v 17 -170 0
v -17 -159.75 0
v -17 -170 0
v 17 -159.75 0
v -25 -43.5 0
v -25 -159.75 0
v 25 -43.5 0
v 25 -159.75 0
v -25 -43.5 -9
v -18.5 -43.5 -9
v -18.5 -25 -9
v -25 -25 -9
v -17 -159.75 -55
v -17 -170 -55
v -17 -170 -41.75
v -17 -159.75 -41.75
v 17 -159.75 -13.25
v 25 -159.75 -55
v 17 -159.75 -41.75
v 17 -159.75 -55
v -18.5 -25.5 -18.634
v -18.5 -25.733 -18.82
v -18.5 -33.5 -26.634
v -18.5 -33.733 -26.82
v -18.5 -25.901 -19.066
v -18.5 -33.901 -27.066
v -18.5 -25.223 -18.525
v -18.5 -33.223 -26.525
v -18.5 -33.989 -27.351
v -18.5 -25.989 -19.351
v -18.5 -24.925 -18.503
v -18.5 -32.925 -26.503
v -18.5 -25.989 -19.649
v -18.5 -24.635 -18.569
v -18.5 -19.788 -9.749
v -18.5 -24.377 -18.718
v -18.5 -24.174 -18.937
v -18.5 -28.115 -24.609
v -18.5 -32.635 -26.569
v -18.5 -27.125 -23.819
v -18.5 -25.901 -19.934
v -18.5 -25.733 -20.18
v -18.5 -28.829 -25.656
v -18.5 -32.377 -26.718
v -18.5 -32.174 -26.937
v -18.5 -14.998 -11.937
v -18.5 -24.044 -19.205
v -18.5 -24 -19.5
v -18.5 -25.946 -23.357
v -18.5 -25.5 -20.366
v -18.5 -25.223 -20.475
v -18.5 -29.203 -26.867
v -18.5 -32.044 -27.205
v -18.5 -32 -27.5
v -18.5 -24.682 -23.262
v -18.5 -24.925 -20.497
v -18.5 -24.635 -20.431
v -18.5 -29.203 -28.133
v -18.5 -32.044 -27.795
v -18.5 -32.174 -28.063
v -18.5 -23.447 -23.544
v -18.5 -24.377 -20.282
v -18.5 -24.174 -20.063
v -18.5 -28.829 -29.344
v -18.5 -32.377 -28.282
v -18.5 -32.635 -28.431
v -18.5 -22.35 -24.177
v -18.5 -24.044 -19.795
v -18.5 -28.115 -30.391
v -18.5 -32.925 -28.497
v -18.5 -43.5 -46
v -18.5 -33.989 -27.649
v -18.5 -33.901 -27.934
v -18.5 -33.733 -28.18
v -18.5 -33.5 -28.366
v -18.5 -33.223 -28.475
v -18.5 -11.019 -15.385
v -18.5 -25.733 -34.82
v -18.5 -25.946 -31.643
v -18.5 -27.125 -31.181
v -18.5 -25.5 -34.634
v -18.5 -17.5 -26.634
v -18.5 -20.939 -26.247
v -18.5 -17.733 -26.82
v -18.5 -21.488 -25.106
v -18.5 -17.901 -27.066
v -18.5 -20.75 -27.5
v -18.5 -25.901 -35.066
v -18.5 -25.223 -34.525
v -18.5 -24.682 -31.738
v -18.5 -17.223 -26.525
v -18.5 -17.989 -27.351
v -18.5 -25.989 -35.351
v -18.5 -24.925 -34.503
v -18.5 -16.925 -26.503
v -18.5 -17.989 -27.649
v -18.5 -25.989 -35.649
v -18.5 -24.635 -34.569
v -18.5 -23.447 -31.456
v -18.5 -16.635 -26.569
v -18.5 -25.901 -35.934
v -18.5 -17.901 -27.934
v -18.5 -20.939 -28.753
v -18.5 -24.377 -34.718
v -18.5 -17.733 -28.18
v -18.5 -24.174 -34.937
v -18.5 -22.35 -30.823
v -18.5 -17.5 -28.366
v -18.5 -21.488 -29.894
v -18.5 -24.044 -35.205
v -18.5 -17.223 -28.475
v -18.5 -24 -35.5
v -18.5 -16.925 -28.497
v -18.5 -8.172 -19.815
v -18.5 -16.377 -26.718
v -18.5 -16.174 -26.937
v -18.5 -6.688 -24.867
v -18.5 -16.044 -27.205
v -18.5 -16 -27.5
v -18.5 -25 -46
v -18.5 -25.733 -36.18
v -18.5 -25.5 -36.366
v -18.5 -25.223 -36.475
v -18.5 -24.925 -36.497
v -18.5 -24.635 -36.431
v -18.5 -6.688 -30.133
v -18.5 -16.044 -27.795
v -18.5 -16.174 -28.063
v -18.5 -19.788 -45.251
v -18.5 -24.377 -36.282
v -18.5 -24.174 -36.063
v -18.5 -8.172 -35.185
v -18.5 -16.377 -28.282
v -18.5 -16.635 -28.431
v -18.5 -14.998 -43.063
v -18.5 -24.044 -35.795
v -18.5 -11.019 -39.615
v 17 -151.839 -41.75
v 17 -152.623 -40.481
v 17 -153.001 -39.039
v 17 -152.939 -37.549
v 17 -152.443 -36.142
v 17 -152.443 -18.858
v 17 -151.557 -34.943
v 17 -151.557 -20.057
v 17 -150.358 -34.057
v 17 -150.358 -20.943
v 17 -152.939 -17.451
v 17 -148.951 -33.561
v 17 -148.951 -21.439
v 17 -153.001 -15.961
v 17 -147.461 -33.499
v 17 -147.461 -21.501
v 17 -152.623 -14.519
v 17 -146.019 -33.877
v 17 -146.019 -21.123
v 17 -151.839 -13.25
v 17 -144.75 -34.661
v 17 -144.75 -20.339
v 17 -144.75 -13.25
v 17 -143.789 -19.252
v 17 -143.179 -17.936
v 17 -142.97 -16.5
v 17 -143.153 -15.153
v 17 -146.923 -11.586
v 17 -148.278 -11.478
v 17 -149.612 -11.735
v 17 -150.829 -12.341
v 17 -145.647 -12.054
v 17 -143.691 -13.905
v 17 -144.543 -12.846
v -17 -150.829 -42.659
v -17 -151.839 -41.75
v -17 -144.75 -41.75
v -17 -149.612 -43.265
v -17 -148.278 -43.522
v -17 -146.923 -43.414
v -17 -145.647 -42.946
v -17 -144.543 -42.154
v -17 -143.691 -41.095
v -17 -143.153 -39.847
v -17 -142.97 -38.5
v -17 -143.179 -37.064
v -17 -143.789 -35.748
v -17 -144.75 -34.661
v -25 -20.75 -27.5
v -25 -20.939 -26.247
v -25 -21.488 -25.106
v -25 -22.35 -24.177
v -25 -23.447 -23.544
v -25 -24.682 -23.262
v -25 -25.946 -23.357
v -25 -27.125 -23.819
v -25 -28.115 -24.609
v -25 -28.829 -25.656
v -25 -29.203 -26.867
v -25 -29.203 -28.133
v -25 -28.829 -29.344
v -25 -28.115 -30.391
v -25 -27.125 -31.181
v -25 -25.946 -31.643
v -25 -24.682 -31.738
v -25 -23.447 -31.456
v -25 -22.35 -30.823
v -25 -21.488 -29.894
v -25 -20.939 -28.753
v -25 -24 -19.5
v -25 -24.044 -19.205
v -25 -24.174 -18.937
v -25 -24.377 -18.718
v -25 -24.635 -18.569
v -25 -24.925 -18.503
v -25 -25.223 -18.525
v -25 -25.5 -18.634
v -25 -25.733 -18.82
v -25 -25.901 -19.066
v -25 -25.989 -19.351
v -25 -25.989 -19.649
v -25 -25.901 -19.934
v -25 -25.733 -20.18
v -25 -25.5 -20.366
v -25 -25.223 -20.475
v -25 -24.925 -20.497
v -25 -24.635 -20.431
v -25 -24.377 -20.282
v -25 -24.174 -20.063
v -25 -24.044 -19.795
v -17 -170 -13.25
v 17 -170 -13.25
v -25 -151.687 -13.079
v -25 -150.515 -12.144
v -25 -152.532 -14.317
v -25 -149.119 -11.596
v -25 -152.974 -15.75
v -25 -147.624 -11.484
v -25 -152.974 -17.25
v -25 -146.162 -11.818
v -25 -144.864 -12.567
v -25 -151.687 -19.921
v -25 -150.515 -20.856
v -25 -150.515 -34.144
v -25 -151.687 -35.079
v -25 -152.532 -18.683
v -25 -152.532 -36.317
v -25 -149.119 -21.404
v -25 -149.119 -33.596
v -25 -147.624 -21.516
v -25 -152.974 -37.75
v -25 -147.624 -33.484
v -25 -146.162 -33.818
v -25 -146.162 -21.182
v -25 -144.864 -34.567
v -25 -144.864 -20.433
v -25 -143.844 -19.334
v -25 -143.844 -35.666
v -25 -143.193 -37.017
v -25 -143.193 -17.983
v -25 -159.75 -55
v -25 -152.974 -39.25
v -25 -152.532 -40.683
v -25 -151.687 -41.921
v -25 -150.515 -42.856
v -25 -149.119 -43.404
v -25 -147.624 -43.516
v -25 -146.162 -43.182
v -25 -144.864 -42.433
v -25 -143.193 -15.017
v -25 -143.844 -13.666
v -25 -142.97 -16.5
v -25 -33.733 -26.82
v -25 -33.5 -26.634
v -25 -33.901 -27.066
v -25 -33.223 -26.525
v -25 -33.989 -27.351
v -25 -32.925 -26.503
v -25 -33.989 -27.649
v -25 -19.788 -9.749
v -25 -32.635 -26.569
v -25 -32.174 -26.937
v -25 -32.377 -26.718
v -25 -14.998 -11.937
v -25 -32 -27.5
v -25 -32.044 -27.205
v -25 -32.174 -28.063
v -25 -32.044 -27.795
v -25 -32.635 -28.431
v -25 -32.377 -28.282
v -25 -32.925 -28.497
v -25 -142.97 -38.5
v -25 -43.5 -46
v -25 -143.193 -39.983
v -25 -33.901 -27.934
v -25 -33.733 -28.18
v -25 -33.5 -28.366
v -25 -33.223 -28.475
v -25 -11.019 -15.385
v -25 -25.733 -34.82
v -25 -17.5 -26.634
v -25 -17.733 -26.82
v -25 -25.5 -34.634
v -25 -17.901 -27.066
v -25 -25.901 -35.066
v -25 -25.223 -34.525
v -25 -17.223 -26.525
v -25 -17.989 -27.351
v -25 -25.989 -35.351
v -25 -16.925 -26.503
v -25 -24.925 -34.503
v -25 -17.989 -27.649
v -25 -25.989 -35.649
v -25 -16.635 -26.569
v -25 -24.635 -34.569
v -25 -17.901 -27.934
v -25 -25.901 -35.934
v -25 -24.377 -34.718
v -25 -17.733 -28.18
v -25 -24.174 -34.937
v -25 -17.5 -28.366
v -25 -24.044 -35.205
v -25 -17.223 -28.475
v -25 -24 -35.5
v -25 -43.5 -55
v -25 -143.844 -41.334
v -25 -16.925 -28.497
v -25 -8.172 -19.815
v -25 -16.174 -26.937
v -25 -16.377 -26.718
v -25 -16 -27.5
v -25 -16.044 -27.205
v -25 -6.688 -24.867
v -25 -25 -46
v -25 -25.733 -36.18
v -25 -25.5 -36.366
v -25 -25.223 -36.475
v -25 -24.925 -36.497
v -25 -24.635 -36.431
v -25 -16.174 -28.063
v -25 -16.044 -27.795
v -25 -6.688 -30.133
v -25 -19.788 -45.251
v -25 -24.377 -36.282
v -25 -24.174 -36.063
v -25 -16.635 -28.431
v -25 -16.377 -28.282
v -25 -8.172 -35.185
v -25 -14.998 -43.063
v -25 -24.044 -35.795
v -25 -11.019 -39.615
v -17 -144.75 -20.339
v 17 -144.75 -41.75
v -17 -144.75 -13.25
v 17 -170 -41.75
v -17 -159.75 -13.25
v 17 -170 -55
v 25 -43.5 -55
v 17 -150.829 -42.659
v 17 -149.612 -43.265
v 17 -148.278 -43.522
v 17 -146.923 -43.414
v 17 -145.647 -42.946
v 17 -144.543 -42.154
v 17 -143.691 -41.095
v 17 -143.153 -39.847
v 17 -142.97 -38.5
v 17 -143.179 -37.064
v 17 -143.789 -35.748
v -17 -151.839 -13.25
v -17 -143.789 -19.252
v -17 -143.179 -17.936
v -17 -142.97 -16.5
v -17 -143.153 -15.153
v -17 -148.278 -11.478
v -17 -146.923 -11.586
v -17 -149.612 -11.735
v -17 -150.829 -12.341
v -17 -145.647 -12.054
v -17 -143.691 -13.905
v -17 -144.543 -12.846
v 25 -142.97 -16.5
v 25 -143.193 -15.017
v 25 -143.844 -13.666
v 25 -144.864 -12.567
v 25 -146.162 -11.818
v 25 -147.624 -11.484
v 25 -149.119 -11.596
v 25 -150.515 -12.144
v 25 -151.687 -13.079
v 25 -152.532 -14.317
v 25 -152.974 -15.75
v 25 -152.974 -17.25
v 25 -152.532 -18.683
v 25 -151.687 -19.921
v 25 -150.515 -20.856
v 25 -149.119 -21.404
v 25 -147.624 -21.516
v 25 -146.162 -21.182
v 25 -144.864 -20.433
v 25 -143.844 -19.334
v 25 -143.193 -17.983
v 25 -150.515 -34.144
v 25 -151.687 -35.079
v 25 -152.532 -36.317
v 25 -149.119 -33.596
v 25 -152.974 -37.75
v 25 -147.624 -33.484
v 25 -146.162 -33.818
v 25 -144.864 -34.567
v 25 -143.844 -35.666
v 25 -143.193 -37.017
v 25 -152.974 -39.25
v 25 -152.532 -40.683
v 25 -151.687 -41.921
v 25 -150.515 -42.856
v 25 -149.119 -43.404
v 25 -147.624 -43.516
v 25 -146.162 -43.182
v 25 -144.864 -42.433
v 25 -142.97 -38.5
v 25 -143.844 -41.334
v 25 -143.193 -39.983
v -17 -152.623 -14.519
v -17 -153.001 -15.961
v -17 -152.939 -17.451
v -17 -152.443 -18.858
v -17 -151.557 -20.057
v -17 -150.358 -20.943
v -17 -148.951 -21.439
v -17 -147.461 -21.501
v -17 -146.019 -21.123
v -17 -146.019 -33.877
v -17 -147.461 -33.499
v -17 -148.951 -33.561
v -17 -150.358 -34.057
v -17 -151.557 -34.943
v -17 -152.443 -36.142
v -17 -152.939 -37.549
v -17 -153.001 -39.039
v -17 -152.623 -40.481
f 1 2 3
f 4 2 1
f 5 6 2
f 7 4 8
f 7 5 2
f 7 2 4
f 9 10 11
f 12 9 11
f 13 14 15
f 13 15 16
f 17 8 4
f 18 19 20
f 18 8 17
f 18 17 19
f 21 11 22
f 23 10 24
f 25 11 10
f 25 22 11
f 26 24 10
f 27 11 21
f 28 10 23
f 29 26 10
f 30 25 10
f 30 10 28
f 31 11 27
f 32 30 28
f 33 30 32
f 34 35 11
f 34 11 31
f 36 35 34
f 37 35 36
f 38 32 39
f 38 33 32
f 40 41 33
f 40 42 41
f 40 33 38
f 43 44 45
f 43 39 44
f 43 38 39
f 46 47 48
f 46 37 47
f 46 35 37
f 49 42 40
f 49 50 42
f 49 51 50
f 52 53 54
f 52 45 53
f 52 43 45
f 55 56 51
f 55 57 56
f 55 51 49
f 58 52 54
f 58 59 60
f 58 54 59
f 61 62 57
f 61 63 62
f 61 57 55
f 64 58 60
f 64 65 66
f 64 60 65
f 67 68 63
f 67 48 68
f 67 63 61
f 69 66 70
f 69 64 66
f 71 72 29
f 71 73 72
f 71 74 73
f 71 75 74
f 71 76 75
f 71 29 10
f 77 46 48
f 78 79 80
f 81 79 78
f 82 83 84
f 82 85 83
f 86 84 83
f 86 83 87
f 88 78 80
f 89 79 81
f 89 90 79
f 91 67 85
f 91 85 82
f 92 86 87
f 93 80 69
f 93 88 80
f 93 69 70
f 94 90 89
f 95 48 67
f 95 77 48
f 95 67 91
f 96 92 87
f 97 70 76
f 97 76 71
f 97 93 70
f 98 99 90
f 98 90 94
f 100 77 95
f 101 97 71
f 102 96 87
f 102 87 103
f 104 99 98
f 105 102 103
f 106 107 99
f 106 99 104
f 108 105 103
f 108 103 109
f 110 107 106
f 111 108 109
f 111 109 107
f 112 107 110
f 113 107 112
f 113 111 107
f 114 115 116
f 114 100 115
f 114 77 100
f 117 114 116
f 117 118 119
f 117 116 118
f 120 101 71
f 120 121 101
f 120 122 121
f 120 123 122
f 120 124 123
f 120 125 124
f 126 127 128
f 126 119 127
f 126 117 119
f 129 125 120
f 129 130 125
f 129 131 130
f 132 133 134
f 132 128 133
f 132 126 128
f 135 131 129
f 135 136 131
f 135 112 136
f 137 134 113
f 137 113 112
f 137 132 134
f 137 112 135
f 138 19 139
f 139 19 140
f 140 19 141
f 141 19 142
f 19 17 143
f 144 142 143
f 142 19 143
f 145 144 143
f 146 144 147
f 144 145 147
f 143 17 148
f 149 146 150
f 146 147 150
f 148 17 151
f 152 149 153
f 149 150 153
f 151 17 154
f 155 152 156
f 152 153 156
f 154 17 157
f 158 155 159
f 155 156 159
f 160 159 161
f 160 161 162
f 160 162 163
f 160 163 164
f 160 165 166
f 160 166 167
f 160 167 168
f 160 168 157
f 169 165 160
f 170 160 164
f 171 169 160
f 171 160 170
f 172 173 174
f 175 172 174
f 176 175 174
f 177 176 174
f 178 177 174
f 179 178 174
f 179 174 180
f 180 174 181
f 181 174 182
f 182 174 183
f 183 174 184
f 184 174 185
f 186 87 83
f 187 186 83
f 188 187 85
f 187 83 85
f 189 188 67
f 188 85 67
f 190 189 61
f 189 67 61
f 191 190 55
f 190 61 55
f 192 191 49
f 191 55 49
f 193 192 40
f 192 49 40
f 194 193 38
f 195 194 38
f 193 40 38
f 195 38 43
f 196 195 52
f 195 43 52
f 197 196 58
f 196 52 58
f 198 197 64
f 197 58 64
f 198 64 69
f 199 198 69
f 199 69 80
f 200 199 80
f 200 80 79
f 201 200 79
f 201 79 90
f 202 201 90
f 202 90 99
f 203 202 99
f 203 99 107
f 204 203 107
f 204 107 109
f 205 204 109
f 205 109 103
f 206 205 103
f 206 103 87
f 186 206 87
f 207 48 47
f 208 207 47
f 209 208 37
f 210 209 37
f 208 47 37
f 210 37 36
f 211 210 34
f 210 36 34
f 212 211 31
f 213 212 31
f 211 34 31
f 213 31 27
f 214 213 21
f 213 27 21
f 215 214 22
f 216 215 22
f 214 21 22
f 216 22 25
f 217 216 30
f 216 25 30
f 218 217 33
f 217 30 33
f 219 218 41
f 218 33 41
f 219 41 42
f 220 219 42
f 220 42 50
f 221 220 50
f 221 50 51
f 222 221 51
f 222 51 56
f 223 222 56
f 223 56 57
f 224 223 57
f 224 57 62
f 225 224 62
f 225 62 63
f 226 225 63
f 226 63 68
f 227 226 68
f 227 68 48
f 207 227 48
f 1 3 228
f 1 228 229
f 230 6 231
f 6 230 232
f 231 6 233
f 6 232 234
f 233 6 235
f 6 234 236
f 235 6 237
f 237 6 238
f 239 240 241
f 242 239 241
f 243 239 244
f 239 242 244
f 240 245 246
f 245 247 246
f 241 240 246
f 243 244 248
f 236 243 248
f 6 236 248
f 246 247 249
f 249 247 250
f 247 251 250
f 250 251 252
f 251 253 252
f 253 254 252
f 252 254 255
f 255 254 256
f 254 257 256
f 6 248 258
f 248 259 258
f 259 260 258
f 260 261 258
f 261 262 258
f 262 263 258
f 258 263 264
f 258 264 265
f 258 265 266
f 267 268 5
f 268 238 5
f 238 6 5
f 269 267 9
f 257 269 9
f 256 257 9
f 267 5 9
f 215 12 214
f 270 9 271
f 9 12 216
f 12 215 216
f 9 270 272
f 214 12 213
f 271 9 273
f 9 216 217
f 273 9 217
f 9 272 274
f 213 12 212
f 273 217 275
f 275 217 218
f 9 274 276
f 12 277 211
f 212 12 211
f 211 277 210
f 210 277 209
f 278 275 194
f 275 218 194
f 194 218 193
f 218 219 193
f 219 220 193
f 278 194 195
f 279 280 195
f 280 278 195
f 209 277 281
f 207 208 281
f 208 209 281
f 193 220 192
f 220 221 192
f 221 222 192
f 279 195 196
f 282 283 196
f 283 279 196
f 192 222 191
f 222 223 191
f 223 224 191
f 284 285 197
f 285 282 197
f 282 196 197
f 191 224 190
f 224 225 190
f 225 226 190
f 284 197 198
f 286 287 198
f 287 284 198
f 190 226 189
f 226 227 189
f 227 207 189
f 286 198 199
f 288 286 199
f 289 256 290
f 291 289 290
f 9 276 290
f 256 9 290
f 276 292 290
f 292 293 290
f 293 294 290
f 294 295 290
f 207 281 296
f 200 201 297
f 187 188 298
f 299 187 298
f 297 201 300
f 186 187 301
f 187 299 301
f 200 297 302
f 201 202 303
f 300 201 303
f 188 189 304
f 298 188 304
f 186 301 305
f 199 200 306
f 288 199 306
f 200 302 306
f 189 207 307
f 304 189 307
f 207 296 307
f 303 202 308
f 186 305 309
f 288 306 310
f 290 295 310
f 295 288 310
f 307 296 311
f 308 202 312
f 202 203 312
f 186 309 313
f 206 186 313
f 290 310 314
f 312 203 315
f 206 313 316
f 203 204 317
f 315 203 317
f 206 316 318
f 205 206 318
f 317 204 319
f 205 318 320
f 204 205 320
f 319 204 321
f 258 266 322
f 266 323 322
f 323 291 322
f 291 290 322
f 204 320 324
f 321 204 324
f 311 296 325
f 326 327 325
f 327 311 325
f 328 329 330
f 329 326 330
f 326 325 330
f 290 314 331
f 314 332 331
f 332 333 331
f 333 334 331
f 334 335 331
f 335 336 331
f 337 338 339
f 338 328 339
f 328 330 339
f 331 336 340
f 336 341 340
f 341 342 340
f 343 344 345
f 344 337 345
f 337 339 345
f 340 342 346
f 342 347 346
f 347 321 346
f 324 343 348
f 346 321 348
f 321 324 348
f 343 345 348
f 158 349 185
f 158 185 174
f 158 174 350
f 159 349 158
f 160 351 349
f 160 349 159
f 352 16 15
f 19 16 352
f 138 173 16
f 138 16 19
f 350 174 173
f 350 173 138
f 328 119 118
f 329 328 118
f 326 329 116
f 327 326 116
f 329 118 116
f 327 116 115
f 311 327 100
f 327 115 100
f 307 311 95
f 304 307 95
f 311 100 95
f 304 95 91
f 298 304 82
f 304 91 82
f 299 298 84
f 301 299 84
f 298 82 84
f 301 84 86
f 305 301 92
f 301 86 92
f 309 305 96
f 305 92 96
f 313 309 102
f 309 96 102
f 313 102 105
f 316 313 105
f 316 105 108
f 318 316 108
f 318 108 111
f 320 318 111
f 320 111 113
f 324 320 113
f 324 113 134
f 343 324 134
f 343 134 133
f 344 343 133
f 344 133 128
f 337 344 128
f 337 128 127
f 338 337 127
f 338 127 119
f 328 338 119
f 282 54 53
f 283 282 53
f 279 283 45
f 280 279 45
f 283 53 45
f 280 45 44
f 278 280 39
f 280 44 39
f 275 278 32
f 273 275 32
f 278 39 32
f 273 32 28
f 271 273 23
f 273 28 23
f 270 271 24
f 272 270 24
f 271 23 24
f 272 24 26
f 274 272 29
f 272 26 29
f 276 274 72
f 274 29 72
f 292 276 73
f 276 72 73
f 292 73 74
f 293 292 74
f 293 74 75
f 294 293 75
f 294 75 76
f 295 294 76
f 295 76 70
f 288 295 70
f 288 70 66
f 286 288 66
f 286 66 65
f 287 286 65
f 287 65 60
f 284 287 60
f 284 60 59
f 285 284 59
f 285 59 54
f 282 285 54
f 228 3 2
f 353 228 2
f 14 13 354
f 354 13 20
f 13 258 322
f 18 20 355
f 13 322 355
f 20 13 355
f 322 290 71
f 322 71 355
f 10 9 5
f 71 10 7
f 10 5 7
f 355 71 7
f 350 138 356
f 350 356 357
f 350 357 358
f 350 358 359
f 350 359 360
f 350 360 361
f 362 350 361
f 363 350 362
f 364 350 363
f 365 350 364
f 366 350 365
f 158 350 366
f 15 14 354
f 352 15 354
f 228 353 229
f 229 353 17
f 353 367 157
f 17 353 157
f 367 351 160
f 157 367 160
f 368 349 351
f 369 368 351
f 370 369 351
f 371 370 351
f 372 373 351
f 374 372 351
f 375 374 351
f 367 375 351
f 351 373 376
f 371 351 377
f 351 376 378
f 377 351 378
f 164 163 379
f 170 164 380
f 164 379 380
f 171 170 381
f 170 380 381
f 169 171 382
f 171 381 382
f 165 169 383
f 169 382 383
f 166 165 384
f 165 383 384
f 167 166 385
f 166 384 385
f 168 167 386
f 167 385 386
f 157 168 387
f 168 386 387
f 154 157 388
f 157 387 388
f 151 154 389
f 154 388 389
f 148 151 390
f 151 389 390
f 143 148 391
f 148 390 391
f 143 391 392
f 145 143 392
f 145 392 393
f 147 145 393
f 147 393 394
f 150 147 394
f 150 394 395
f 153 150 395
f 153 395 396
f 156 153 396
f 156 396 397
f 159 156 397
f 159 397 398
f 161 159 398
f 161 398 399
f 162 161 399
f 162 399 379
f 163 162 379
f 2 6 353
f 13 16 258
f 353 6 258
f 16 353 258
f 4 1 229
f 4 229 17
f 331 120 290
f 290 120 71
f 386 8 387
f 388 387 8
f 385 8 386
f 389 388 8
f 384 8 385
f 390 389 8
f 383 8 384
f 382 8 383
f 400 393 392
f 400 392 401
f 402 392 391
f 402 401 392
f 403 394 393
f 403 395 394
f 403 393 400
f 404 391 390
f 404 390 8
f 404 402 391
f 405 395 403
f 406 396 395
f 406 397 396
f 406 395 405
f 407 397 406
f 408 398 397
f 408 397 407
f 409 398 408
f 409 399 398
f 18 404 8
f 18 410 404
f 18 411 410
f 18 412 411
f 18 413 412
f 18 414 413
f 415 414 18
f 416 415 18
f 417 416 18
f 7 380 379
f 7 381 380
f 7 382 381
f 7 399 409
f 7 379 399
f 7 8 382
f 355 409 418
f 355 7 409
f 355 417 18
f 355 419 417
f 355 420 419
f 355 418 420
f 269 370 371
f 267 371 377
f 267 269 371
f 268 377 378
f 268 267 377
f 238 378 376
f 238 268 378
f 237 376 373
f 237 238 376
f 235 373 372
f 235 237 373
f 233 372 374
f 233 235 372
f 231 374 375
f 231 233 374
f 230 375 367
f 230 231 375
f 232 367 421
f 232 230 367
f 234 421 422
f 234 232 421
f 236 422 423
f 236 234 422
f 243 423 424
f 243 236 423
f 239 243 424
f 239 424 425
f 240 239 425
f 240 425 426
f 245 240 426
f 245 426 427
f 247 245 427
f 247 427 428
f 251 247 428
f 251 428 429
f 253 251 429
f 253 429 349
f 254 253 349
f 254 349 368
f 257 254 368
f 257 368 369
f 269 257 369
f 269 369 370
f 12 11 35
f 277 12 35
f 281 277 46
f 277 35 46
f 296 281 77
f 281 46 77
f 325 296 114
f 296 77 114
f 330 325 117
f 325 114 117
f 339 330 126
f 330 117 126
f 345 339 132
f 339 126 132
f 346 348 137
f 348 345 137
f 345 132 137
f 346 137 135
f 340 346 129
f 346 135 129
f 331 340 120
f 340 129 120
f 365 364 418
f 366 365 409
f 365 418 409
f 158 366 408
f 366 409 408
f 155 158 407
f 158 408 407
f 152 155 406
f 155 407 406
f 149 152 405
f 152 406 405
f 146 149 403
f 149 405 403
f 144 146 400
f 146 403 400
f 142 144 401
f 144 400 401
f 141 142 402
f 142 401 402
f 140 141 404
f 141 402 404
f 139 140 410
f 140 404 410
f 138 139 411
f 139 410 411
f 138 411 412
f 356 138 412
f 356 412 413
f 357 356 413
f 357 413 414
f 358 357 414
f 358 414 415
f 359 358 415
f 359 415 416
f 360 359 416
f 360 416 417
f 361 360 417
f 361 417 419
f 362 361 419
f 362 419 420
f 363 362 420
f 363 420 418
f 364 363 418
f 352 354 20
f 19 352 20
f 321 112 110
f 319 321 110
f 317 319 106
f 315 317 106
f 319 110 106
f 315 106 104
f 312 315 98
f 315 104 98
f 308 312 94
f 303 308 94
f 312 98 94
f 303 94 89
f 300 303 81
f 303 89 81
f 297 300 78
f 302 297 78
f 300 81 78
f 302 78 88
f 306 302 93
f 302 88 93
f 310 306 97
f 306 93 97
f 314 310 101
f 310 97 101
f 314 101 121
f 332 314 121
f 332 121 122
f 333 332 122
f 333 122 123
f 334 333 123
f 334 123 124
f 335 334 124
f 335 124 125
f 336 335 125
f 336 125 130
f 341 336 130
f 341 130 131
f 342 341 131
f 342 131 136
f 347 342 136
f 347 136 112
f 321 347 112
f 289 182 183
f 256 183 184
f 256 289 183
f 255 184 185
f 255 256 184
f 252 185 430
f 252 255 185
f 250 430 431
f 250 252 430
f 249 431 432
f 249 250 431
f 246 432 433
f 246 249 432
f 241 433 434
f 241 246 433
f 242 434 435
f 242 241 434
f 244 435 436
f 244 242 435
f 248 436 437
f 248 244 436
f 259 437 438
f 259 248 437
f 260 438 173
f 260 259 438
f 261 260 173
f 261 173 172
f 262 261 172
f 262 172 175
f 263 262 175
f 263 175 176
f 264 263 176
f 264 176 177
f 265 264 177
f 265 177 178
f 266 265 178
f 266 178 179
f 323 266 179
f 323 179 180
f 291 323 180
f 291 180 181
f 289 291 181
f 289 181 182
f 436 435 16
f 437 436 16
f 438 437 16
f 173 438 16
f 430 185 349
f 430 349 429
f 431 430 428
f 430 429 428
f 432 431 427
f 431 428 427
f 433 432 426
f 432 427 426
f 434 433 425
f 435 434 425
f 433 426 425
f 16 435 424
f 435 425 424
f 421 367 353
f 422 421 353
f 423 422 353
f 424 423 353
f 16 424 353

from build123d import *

# Parameters (mm, degrees)
SKETCH1_W               = 50
SKETCH1_H               = 150
BOSS_EXTRUDE1_DEPTH     = 55
CUT_EXTRUDE1_DEPTH      = 168.406690428
CUT_EXTRUDE1_DEPTH_BACK = 45
SKETCH2_R               = 10.25
SKETCH7_R               = 1
SKETCH7_R_2             = 4.25
CUT_EXTRUDE3_DEPTH      = 10
SKETCH8_W               = 55
SKETCH8_H               = 55
SKETCH8_R               = 10.25
BOSS_EXTRUDE2_DEPTH     = 50
SKETCH10_W              = 8
SKETCH10_H              = 10.25
SKETCH10_W_2            = 17
SKETCH10_H_2            = 1
SKETCH10_W_3            = 34
SKETCH10_H_3            = 20
SKETCH10_H_4            = 5
CUT_EXTRUDE4_DEPTH      = 214.717102732
SKETCH11_W              = 34
SKETCH11_H              = 13.25
BOSS_EXTRUDE4_DEPTH     = 25
SKETCH13_W              = 55
SKETCH13_H              = 10
CUT_EXTRUDE5_DEPTH      = 8
SKETCH14_R              = 5.030159043
CUT_EXTRUDE6_DEPTH      = 8
SKETCH15_W              = 34
SKETCH15_H              = 0.25
BOSS_EXTRUDE5_DEPTH     = 13.25
CUT_EXTRUDE7_DEPTH      = 181.416185527
BOSS_EXTRUDE6_START     = 1.5
SKETCH19_R              = 10.25
SKETCH19_R_2            = 1
SKETCH19_R_3            = 4.25
BOSS_EXTRUDE6_DEPTH     = 1.5
CUT_EXTRUDE8_DEPTH      = 184.89467094


with BuildPart() as part:
    # Sketch1 → Boss-Extrude1 (new body)
    with BuildSketch(Plane.XY):
        with Locations((0, -75)):
            Rectangle(SKETCH1_W, SKETCH1_H)
    extrude(amount=-BOSS_EXTRUDE1_DEPTH)

    # Sketch2 → Cut-Extrude1 (cut, two sides: drawn at the far end of the back side and taken through both)
    with BuildSketch(Plane(origin=(25, 0, 0), x_dir=(0, 0, -1), z_dir=(1, 0, 0)).offset(-CUT_EXTRUDE1_DEPTH_BACK)):
        with Locations(Location((27.5, -25, 0), (0, 0, 270))):
            Circle(SKETCH2_R)
    extrude(amount=CUT_EXTRUDE1_DEPTH + CUT_EXTRUDE1_DEPTH_BACK, mode=Mode.SUBTRACT)

    # Sketch7 → Cut-Extrude3 (cut)
    with BuildSketch(Plane(origin=(-20, 0, 0), x_dir=(0, 0, -1), z_dir=(1, 0, 0))):
        with Locations(Location((27.5, -17, 0), (0, 0, 90))):
            Circle(SKETCH7_R)
        with Locations(Location((35.5, -25, 0), (0, 0, 90))):
            Circle(SKETCH7_R)
        with Locations(Location((27.5, -33, 0), (0, 0, 90))):
            Circle(SKETCH7_R)
        with Locations(Location((19.5, -25, 0), (0, 0, 90))):
            Circle(SKETCH7_R)
        with Locations(Location((27.5, -25, 0), (0, 0, 90))):
            Circle(SKETCH7_R_2)
    extrude(amount=-CUT_EXTRUDE3_DEPTH, mode=Mode.SUBTRACT)

    # Sketch8 → Boss-Extrude2 (add)
    with BuildSketch(Plane(origin=(25, 0, 0), x_dir=(0, 0, -1), z_dir=(1, 0, 0))):
        with Locations((27.5, -177.5)):
            Rectangle(SKETCH8_W, SKETCH8_H)
        with Locations(Location((27.5, -180, 0), (0, 0, 90))):
            Circle(SKETCH8_R, mode=Mode.SUBTRACT)
    extrude(amount=-BOSS_EXTRUDE2_DEPTH)

    # Sketch10 → Cut-Extrude4 (cut, through all)
    with BuildSketch(Plane.XY):
        Polygon((-17, -205), (17, -205), (17, -191.25), (0, -191.25), (-17, -191.25), align=None)
        Polygon((-25, -205), (-17, -205), (-17, -191.25), (-17, -190.25), (-25, -190.25), align=None)
        Polygon((17, -191.25), (17, -205), (25, -205), (25, -190.25), (17, -190.25), align=None)
        with Locations((-21, -185.125)):
            Rectangle(SKETCH10_W, SKETCH10_H)
        with Locations((-21, -174.875)):
            Rectangle(SKETCH10_W, SKETCH10_H)
        with Locations((21, -174.875)):
            Rectangle(SKETCH10_W, SKETCH10_H)
        with Locations((21, -185.125)):
            Rectangle(SKETCH10_W, SKETCH10_H)
        with Locations((-8.5, -185.125)):
            Rectangle(SKETCH10_W_2, SKETCH10_H)
        with Locations((8.5, -185.125)):
            Rectangle(SKETCH10_W_2, SKETCH10_H)
        Polygon((0, -180), (17, -180), (17, -169.75), (-17, -169.75), (-17, -180), align=None)
        with Locations((-8.5, -190.75)):
            Rectangle(SKETCH10_W_2, SKETCH10_H_2)
        with Locations((8.5, -190.75)):
            Rectangle(SKETCH10_W_2, SKETCH10_H_2)
        with Locations((0, -154.75)):
            Rectangle(SKETCH10_W_3, SKETCH10_H_3)
        with Locations((0, -167.25)):
            Rectangle(SKETCH10_W_3, SKETCH10_H_4)
    extrude(amount=-CUT_EXTRUDE4_DEPTH, mode=Mode.SUBTRACT)

    # Sketch11 → Boss-Extrude4 (add)
    with BuildSketch(Plane.XZ.offset(144.75)):
        with Locations((0, -6.625)):
            Rectangle(SKETCH11_W, SKETCH11_H)
        with Locations((0, -48.375)):
            Rectangle(SKETCH11_W, SKETCH11_H)
    extrude(amount=BOSS_EXTRUDE4_DEPTH)

    # Sketch13 → Cut-Extrude5 (cut)
    with BuildSketch(Plane(origin=(25, 0, 0), x_dir=(0, 0, -1), z_dir=(1, 0, 0))):
        with Locations((27.5, -164.75)):
            Rectangle(SKETCH13_W, SKETCH13_H)
    cut_extrude5 = extrude(amount=-CUT_EXTRUDE5_DEPTH, mode=Mode.SUBTRACT)

    # Mirror2: Cut-Extrude5 across plane
    add(cut_extrude5.mirror(Plane(origin=(0, 0, 0), x_dir=(0, 0, 1), z_dir=(1, 0, 0))), mode=Mode.SUBTRACT)

    # Sketch14 → Cut-Extrude6 (cut)
    with BuildSketch(Plane(origin=(25, 0, 0), x_dir=(0, 0, -1), z_dir=(1, 0, 0))):
        with Locations(Location((16.5, -148, 0), (0, 0, 90))):
            Circle(SKETCH14_R)
        with Locations(Location((38.5, -148, 0), (0, 0, 90))):
            Circle(SKETCH14_R)
    cut_extrude6 = extrude(amount=-CUT_EXTRUDE6_DEPTH, mode=Mode.SUBTRACT)

    # Mirror3: Cut-Extrude6 across plane
    add(cut_extrude6.mirror(Plane(origin=(0, 0, 0), x_dir=(0, 0, 1), z_dir=(1, 0, 0))), mode=Mode.SUBTRACT)

    # Sketch15 → Boss-Extrude5 (add)
    with BuildSketch(Plane.XY):
        with Locations((0, -169.875)):
            Rectangle(SKETCH15_W, SKETCH15_H)
    boss_extrude5 = extrude(amount=-BOSS_EXTRUDE5_DEPTH)

    # Mirror4: Boss-Extrude5 across plane
    add(boss_extrude5.mirror(Plane.XY.offset(-27.5)))

    # Sketch16 → Cut-Extrude7 (cut, through all)
    with BuildSketch(Plane.XY):
        Polygon((-18.5, 0), (-18.5, -14.75), (-18.5, -35.25), (-18.5, -43.5), (25, -43.5), (25, 0), align=None)
    extrude(amount=-CUT_EXTRUDE7_DEPTH, mode=Mode.SUBTRACT)

    # Sketch19 → Boss-Extrude6 (add)
    with BuildSketch(Plane(origin=(-20, 0, 0), x_dir=(0, 0, -1), z_dir=(1, 0, 0)).offset(BOSS_EXTRUDE6_START)):
        with Locations((27.5, -25)):
            Circle(SKETCH19_R)
        with Locations(Location((27.5, -17, 0), (0, 0, 90))):
            Circle(SKETCH19_R_2, mode=Mode.SUBTRACT)
        with Locations(Location((27.5, -33, 0), (0, 0, 90))):
            Circle(SKETCH19_R_2, mode=Mode.SUBTRACT)
        with Locations(Location((19.5, -25, 0), (0, 0, 90))):
            Circle(SKETCH19_R_2, mode=Mode.SUBTRACT)
        with Locations(Location((35.5, -25, 0), (0, 0, 90))):
            Circle(SKETCH19_R_2, mode=Mode.SUBTRACT)
        with Locations(Location((27.5, -25, 0), (0, 0, 90))):
            Circle(SKETCH19_R_3, mode=Mode.SUBTRACT)
    extrude(amount=-BOSS_EXTRUDE6_DEPTH)

    # Sketch20 → Cut-Extrude8 (cut, through all)
    with BuildSketch(Plane(origin=(-18.5, 0, 0), x_dir=(0, 0, -1), z_dir=(1, 0, 0))):
        with BuildLine():
            Line((0, 0), (0, -43.5))
            Line((0, -43.5), (9, -43.5))
            Line((9, -43.5), (9, -25))
            ThreePointArc((9, -25), (27.5, -6.5), (46, -25))
            Line((46, -25), (46, -43.5))
            Line((46, -43.5), (55, -43.5))
            Line((55, -43.5), (55, 0))
            Line((55, 0), (0, 0))
        make_face()
    extrude(amount=-CUT_EXTRUDE8_DEPTH, mode=Mode.SUBTRACT)


solid = part.part
